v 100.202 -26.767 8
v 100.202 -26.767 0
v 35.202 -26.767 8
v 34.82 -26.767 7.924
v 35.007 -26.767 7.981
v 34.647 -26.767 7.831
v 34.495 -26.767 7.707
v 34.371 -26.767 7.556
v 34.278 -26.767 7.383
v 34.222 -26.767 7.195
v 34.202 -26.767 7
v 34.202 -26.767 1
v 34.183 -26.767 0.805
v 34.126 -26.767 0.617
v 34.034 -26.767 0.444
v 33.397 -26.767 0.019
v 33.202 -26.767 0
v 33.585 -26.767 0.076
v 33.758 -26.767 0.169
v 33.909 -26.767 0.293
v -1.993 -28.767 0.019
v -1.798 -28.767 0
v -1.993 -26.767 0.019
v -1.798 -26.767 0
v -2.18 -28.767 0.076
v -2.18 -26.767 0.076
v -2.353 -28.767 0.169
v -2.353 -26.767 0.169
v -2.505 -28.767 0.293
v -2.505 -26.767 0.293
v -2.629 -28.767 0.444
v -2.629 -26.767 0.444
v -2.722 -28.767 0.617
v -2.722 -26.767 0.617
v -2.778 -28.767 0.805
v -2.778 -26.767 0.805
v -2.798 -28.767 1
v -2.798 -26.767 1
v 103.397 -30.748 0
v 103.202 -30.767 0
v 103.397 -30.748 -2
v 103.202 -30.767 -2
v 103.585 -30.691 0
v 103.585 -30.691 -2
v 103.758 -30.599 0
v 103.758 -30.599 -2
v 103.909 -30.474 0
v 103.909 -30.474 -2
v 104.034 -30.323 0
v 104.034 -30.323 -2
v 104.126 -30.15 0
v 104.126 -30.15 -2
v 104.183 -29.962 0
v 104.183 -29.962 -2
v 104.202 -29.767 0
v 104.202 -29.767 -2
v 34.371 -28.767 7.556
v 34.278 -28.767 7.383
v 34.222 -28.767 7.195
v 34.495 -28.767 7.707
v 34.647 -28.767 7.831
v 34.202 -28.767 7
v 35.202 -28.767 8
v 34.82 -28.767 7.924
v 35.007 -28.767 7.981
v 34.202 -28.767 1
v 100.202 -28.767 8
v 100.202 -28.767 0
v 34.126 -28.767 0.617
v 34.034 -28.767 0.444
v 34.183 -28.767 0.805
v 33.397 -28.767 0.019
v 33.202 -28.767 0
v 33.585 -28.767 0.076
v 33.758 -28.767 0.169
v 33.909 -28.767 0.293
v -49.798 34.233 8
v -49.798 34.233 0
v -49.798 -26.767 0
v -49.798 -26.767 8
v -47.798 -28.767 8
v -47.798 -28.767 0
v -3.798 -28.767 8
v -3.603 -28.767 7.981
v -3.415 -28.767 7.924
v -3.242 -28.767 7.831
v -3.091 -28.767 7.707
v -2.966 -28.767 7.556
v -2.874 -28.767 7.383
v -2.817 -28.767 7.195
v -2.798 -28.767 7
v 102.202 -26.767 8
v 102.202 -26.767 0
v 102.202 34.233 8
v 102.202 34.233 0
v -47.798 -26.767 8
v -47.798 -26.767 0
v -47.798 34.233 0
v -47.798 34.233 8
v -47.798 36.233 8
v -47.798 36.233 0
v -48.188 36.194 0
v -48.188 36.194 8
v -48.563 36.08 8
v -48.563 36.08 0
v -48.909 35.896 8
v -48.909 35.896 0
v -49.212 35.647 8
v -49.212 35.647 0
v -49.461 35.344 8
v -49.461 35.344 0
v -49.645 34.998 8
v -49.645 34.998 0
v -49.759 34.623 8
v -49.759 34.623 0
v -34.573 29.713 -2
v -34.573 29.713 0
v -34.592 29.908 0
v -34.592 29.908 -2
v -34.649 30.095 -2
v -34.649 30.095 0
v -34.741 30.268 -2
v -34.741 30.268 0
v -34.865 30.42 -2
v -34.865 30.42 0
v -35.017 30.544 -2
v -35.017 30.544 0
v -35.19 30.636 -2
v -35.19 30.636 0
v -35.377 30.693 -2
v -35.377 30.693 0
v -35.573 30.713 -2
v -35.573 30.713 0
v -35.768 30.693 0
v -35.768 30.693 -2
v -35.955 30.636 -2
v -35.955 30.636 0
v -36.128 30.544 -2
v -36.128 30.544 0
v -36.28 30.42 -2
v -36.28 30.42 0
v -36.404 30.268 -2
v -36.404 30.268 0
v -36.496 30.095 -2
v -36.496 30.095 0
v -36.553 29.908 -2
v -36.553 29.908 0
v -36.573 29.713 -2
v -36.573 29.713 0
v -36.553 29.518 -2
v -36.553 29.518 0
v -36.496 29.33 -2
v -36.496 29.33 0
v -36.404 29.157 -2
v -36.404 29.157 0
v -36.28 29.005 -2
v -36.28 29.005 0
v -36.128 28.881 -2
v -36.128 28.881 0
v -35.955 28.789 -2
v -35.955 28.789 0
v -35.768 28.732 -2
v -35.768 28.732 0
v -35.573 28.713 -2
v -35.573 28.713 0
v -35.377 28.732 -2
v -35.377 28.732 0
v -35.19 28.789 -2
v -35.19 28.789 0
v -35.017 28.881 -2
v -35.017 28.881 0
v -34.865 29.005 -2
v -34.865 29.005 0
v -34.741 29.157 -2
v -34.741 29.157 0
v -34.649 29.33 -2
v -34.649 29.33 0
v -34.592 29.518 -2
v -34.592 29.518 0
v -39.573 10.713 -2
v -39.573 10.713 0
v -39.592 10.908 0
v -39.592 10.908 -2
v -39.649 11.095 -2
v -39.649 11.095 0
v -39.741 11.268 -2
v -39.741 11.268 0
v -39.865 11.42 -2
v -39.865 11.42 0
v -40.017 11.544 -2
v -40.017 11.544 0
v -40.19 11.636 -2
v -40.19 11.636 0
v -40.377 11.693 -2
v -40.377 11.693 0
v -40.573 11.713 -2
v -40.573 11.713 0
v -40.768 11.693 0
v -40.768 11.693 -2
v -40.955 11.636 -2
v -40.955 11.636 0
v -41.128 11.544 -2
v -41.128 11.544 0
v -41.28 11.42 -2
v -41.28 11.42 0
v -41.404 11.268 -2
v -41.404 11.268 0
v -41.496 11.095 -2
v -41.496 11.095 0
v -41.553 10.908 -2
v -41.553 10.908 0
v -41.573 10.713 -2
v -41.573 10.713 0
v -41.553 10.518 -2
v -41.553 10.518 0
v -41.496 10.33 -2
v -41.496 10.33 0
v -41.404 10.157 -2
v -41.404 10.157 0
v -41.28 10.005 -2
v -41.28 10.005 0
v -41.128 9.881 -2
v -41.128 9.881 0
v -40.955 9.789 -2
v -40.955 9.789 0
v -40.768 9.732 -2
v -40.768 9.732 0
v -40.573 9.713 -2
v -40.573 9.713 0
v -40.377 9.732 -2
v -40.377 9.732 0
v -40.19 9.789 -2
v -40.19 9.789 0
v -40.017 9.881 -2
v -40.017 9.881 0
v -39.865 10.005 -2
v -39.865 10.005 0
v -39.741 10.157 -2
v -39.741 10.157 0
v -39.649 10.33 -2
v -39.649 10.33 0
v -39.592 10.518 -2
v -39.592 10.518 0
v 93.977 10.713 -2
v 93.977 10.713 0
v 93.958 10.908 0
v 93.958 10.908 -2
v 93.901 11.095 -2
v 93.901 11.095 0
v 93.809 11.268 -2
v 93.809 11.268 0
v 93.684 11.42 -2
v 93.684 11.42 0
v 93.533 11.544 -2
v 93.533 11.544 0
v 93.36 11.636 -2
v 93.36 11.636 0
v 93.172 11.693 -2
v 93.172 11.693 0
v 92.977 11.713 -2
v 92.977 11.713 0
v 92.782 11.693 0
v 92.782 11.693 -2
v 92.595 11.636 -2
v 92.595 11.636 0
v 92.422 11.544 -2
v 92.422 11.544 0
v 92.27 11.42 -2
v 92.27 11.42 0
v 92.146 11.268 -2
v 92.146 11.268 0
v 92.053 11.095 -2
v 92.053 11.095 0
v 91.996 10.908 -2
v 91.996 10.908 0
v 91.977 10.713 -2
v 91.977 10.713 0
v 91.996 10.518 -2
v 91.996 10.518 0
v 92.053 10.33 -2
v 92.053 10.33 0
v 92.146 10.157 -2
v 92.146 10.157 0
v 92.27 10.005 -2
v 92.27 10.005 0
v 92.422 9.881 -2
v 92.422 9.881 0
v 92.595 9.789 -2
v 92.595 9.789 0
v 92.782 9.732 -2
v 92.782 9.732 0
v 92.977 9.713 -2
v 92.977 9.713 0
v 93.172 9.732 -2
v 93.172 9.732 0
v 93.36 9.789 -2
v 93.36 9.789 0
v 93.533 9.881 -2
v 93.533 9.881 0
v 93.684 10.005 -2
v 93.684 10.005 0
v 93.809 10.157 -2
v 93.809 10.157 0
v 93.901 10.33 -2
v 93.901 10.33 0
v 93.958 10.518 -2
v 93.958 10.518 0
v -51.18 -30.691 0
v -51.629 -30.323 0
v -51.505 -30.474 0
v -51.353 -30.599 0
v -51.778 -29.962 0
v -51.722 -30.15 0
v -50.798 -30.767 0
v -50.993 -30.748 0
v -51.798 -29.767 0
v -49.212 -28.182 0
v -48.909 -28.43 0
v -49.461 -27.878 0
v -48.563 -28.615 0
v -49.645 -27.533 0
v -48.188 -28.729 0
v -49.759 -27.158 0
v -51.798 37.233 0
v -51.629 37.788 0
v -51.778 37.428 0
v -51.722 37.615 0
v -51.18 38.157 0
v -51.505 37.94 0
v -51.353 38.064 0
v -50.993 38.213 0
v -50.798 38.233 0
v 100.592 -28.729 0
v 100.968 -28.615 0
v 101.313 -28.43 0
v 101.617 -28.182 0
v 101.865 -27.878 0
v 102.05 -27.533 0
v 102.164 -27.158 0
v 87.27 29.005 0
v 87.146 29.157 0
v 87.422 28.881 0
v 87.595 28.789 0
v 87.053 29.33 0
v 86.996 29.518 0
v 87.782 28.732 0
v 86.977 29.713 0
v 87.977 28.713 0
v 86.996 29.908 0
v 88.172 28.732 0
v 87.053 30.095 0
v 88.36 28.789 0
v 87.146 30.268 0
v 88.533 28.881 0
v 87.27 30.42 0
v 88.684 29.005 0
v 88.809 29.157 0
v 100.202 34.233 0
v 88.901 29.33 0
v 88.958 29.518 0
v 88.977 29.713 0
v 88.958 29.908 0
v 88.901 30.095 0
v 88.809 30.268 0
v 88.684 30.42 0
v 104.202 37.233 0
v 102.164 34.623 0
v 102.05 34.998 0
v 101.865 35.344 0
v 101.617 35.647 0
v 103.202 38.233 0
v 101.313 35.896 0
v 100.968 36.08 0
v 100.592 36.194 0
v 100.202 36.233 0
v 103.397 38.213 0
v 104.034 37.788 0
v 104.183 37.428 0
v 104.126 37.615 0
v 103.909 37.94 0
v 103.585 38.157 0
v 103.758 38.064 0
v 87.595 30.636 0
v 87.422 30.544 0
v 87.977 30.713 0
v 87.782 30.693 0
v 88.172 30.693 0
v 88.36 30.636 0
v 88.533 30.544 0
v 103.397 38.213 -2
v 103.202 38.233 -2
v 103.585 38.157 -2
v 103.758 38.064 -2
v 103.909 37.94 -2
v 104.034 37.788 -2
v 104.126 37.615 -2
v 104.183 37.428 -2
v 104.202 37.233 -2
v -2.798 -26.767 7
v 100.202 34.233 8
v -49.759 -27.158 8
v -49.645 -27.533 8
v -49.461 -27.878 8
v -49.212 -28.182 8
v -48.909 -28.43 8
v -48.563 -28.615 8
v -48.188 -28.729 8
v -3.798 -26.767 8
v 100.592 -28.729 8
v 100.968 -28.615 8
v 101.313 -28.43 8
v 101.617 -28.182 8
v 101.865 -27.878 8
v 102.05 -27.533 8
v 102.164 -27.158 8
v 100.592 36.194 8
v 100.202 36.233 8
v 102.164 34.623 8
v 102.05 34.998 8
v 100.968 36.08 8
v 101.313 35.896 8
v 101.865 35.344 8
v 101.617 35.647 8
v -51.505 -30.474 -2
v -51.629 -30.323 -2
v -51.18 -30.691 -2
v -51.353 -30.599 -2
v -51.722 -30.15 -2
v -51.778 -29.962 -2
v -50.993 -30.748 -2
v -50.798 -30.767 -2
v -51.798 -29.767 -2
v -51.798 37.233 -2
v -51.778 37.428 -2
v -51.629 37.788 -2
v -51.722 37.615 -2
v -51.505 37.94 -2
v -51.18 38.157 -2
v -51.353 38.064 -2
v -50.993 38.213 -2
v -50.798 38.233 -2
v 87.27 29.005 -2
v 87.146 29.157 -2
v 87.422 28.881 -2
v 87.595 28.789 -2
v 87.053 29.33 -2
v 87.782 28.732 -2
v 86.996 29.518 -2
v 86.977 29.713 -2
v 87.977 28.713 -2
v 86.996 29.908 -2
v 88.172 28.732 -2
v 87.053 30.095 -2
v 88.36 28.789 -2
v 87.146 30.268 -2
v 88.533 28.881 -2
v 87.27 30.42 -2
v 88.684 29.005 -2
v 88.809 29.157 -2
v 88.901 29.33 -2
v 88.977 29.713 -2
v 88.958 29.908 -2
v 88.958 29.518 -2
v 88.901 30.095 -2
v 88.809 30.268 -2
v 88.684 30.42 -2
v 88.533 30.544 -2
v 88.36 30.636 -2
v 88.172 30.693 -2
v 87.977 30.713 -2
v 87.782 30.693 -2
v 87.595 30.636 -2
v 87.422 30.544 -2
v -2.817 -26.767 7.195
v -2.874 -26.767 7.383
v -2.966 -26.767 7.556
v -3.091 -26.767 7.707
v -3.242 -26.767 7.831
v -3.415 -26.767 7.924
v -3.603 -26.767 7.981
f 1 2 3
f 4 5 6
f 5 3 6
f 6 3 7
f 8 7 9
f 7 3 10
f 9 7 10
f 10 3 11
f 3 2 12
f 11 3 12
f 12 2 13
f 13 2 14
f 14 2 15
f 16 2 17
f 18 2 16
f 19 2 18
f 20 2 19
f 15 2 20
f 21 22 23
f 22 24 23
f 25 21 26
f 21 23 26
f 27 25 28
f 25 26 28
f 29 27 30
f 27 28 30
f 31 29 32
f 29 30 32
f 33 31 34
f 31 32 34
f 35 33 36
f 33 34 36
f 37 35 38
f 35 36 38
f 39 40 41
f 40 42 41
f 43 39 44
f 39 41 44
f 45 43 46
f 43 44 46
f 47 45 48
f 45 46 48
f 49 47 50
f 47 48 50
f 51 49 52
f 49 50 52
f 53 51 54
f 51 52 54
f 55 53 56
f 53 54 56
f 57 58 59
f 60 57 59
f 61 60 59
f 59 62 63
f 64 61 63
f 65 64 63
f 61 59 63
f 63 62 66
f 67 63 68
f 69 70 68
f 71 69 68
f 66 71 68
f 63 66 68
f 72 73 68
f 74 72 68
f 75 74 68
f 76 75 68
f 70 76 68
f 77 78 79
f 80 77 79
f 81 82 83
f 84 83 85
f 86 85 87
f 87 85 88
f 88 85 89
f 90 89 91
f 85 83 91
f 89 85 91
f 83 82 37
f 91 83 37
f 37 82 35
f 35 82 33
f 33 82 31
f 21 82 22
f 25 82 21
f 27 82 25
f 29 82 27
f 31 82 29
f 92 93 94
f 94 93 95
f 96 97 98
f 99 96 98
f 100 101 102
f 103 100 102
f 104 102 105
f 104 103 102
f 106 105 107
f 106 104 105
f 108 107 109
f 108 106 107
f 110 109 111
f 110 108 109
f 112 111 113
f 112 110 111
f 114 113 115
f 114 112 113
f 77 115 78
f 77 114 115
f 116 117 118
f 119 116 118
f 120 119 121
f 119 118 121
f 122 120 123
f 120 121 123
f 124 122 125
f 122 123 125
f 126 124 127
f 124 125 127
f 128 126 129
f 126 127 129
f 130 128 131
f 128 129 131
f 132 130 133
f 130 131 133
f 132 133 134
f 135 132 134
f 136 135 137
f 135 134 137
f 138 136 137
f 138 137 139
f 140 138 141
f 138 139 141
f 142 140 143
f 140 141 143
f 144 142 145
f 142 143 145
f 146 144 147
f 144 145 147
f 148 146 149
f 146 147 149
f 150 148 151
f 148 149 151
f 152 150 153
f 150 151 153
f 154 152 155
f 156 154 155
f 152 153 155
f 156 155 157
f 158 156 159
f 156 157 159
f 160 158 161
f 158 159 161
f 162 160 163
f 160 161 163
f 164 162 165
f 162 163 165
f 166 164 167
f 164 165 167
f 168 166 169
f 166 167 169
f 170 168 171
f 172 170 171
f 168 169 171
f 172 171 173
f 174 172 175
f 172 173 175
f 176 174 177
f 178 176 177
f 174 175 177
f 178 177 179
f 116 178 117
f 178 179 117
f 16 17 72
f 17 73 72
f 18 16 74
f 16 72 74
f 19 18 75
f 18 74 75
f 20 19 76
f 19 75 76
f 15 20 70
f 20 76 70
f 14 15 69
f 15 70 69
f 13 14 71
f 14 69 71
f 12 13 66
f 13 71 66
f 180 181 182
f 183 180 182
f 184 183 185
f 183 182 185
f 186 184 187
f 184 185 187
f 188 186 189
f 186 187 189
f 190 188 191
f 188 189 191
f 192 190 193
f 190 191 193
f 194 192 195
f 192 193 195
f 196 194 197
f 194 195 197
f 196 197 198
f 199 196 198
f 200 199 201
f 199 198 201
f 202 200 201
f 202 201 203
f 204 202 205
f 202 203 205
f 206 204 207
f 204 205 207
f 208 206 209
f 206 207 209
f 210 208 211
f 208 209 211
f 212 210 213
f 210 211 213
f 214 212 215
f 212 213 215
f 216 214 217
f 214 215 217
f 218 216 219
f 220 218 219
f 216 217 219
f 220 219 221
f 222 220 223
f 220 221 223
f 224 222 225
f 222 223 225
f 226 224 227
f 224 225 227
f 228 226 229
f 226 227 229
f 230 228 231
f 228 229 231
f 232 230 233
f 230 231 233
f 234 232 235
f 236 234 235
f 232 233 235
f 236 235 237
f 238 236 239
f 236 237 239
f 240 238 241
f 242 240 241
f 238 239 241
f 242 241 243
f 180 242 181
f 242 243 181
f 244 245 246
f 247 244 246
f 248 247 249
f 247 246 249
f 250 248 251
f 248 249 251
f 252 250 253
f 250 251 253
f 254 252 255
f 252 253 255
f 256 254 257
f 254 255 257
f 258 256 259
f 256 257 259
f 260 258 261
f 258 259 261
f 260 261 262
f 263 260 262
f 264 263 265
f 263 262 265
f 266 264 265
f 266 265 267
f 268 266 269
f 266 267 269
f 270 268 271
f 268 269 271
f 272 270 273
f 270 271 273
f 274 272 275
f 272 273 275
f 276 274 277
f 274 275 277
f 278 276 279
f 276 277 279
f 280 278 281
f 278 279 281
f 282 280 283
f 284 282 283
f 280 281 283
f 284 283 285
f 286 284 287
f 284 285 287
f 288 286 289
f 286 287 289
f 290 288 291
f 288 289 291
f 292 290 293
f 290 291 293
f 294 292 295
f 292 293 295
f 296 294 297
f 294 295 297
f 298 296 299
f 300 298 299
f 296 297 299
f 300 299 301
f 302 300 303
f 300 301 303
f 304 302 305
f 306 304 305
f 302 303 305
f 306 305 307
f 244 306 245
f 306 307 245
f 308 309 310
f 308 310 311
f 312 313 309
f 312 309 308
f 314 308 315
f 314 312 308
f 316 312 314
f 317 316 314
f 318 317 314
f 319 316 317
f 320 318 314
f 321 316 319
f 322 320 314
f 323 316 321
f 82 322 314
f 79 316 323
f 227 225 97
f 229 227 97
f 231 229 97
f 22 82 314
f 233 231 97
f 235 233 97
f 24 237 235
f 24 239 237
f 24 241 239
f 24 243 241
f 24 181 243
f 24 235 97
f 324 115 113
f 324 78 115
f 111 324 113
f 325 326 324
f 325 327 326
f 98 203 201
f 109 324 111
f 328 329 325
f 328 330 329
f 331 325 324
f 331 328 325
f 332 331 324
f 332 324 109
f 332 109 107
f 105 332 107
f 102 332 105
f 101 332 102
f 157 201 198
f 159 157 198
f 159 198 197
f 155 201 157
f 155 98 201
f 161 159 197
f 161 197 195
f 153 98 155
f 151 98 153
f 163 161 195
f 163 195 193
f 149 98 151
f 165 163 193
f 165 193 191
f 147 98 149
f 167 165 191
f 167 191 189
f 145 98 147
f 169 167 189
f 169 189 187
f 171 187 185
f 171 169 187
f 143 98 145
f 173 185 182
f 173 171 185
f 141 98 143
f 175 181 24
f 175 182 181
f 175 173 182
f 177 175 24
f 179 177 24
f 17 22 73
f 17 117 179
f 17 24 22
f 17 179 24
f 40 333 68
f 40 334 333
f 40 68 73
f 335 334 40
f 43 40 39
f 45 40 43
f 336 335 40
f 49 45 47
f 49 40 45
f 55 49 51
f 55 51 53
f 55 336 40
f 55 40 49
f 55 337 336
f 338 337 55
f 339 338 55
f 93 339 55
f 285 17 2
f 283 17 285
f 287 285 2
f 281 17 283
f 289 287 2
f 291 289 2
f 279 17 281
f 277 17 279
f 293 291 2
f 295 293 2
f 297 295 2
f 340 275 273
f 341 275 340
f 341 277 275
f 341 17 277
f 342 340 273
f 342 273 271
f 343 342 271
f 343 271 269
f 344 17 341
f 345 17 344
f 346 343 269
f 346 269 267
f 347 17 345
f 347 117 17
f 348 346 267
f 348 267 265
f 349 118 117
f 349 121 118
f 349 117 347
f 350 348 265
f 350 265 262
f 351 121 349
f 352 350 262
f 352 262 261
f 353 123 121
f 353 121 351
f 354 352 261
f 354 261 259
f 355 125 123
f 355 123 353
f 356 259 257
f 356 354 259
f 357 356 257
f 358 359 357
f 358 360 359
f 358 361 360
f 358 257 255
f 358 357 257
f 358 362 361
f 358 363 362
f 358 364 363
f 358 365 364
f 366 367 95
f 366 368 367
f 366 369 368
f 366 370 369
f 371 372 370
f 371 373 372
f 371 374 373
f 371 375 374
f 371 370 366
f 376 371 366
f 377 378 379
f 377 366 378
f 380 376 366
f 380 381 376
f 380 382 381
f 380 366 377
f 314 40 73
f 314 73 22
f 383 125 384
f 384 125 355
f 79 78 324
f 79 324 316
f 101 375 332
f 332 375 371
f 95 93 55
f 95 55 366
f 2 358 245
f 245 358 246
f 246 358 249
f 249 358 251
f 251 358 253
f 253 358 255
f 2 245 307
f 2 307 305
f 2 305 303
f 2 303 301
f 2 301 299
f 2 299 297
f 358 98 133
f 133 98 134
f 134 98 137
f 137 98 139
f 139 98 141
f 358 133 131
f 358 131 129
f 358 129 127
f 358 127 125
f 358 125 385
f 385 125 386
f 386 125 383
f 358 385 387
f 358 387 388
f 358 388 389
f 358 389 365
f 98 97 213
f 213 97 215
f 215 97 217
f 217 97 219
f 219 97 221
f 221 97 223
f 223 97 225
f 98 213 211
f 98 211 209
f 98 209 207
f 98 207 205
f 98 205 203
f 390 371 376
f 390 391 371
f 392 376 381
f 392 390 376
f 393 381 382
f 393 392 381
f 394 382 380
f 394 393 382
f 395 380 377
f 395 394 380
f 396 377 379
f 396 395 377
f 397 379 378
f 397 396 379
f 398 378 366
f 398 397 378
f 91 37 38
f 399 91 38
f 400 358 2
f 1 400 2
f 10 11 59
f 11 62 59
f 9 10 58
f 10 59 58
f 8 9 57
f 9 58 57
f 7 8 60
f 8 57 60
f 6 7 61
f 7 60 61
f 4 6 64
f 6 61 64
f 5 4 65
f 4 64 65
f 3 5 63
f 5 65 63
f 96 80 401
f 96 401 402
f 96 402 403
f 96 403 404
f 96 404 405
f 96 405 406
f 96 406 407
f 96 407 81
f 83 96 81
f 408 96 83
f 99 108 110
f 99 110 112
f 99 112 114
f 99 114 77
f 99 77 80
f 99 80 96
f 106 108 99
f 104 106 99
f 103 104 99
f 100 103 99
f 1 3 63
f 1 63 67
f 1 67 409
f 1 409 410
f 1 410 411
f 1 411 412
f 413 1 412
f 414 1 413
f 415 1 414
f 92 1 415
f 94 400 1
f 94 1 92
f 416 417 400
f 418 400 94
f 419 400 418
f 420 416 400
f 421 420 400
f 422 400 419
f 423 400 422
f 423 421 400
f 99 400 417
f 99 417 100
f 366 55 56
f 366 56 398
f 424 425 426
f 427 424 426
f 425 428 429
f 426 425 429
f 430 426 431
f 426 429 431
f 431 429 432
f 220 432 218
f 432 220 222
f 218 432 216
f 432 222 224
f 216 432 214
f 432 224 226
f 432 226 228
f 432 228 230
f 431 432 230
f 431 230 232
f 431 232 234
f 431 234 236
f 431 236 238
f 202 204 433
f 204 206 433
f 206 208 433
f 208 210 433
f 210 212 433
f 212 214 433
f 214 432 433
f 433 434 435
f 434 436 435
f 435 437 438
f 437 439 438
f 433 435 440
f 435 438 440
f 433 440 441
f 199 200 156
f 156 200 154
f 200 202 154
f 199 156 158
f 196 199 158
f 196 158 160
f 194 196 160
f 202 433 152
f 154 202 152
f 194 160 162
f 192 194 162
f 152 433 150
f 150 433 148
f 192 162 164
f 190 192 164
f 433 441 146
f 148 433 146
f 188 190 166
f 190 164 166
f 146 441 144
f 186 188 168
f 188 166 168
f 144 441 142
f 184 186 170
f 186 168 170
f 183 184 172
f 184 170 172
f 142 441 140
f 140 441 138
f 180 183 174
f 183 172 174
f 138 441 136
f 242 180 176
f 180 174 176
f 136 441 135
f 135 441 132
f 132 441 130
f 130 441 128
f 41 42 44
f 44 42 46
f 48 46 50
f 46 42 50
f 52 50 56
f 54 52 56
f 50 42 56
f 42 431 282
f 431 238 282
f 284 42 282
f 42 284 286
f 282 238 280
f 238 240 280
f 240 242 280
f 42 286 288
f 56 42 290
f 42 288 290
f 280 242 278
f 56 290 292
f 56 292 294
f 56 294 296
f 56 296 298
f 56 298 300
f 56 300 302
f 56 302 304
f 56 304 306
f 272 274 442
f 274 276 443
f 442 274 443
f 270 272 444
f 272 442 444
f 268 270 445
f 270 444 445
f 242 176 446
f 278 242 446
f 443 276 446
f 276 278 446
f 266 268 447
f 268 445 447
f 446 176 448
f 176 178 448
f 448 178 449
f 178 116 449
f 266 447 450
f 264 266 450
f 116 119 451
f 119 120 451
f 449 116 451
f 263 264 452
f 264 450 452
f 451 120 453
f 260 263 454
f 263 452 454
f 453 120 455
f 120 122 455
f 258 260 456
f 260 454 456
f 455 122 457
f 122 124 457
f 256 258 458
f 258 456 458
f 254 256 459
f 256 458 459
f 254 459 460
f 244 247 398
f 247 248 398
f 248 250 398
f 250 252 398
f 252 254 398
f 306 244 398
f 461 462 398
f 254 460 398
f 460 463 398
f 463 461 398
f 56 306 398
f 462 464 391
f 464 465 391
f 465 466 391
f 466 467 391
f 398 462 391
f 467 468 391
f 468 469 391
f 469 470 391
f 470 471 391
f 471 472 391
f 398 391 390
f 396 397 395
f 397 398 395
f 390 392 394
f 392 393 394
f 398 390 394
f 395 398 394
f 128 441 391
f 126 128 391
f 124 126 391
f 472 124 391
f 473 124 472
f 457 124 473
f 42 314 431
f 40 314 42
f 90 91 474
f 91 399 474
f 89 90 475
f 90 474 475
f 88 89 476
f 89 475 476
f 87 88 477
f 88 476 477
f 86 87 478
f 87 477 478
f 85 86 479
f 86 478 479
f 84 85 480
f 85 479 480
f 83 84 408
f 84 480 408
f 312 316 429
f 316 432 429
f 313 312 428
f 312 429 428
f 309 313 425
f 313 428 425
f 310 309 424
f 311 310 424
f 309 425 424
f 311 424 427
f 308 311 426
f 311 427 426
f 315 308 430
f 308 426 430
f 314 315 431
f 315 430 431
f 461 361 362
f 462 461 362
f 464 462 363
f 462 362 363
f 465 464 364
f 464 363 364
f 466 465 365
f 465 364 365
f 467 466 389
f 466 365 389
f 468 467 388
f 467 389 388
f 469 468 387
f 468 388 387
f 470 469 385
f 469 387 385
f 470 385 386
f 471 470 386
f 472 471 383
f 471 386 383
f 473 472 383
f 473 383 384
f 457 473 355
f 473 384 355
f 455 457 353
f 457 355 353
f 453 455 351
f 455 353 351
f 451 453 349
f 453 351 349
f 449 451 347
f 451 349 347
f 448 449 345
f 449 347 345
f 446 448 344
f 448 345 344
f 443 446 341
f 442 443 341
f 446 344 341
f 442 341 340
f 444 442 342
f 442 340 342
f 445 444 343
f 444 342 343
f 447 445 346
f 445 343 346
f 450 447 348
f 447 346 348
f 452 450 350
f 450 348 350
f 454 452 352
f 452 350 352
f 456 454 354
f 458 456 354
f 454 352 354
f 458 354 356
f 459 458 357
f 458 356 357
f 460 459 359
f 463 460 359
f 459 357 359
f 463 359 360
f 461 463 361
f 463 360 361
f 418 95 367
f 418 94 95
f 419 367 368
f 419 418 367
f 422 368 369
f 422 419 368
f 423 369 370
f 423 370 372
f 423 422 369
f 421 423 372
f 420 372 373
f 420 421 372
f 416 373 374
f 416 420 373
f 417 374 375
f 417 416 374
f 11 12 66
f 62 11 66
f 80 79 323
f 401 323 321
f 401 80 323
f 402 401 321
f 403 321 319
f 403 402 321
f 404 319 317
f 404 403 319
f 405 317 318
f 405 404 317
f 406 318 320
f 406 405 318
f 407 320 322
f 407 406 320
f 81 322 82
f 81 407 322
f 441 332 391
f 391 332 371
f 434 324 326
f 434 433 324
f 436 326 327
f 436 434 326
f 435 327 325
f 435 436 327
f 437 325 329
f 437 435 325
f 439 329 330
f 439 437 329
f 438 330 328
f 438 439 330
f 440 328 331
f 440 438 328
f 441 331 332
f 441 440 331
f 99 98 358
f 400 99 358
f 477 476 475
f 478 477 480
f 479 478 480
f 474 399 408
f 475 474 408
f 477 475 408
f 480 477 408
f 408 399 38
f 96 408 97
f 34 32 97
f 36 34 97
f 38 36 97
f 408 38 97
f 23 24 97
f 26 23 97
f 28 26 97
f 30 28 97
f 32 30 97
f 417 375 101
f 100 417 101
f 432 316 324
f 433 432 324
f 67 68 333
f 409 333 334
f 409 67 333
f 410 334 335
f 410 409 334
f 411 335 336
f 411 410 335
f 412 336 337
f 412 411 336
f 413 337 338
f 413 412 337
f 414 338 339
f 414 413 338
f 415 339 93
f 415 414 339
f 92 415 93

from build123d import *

# Parameters (mm, degrees)
F0_W     = 156
F0_H     = 69.000003
F0_R     = 1
F0_W_2   = 37
F0_H_2   = 2
F1_DEPTH = 2
F2_DEPTH = 8
F3_R     = 1
F4_R     = 2


with BuildPart() as f1:
    # F0 (on Top) → F1 (new body)
    with BuildSketch(Plane.XY):
        with Locations((26.202309, 3.732657)):
            Rectangle(F0_W, F0_H)
        Polygon((-49.797689, 36.232657), (102.202308, 36.232657), (102.202308, -28.767343), (34.202309, -28.767343), (-2.797691, -28.767343), (-49.797689, -28.767343), align=None, mode=Mode.SUBTRACT)
        Polygon((102.202308, -28.767343), (102.202308, 36.232657), (-49.797689, 36.232657), (-49.797689, -28.767343), (-2.797691, -28.767343), (-2.797691, -26.767343), (-47.797689, -26.767343), (-47.797689, 34.232657), (100.202308, 34.232657), (100.202308, -26.767343), (34.202309, -26.767343), (34.202309, -28.767343), align=None)
        Polygon((-2.797691, -26.767343), (34.202309, -26.767343), (100.202308, -26.767343), (100.202308, 34.232657), (-47.797689, 34.232657), (-47.797689, -26.767343), align=None)
        with Locations((-40.572589, 10.712606)):
            Circle(F0_R, mode=Mode.SUBTRACT)
        with Locations((-35.572589, 29.712606)):
            Circle(F0_R, mode=Mode.SUBTRACT)
        with Locations((92.977207, 10.712606)):
            Circle(F0_R, mode=Mode.SUBTRACT)
        with Locations((87.977207, 29.712606)):
            Circle(F0_R, mode=Mode.SUBTRACT)
        with Locations((15.702309, -27.767343)):
            Rectangle(F0_W_2, F0_H_2)
    extrude(amount=-F1_DEPTH)

    # F0 (on Top) → F2 (join)
    with BuildSketch(Plane.XY):
        Polygon((102.202308, -28.767343), (102.202308, 36.232657), (-49.797689, 36.232657), (-49.797689, -28.767343), (-2.797691, -28.767343), (-2.797691, -26.767343), (-47.797689, -26.767343), (-47.797689, 34.232657), (100.202308, 34.232657), (100.202308, -26.767343), (34.202309, -26.767343), (34.202309, -28.767343), align=None)
    extrude(amount=F2_DEPTH)

    # F3
    f3_edges = [f1.edges().sort_by_distance(p)[0] for p in [
        (-51.797691, 38.232658, -1),
        (-51.797691, -30.767345, -1),
        (104.202309, -30.767345, -1),
        (104.202309, 38.232658, -1),
        (34.202309, -27.767343, 8),
        (-2.797691, -27.767343, 8),
        (34.202309, -27.767343, 0),
        (-2.797691, -27.767343, 0),
    ]]
    fillet(f3_edges, radius=F3_R)

    # F4
    f4_edges = [f1.edges().sort_by_distance(p)[0] for p in [
        (-49.797689, -28.767343, 4),
        (102.202308, -28.767343, 4),
        (102.202308, 36.232657, 4),
        (-49.797689, 36.232657, 4),
    ]]
    fillet(f4_edges, radius=F4_R)


solid = f1.part
